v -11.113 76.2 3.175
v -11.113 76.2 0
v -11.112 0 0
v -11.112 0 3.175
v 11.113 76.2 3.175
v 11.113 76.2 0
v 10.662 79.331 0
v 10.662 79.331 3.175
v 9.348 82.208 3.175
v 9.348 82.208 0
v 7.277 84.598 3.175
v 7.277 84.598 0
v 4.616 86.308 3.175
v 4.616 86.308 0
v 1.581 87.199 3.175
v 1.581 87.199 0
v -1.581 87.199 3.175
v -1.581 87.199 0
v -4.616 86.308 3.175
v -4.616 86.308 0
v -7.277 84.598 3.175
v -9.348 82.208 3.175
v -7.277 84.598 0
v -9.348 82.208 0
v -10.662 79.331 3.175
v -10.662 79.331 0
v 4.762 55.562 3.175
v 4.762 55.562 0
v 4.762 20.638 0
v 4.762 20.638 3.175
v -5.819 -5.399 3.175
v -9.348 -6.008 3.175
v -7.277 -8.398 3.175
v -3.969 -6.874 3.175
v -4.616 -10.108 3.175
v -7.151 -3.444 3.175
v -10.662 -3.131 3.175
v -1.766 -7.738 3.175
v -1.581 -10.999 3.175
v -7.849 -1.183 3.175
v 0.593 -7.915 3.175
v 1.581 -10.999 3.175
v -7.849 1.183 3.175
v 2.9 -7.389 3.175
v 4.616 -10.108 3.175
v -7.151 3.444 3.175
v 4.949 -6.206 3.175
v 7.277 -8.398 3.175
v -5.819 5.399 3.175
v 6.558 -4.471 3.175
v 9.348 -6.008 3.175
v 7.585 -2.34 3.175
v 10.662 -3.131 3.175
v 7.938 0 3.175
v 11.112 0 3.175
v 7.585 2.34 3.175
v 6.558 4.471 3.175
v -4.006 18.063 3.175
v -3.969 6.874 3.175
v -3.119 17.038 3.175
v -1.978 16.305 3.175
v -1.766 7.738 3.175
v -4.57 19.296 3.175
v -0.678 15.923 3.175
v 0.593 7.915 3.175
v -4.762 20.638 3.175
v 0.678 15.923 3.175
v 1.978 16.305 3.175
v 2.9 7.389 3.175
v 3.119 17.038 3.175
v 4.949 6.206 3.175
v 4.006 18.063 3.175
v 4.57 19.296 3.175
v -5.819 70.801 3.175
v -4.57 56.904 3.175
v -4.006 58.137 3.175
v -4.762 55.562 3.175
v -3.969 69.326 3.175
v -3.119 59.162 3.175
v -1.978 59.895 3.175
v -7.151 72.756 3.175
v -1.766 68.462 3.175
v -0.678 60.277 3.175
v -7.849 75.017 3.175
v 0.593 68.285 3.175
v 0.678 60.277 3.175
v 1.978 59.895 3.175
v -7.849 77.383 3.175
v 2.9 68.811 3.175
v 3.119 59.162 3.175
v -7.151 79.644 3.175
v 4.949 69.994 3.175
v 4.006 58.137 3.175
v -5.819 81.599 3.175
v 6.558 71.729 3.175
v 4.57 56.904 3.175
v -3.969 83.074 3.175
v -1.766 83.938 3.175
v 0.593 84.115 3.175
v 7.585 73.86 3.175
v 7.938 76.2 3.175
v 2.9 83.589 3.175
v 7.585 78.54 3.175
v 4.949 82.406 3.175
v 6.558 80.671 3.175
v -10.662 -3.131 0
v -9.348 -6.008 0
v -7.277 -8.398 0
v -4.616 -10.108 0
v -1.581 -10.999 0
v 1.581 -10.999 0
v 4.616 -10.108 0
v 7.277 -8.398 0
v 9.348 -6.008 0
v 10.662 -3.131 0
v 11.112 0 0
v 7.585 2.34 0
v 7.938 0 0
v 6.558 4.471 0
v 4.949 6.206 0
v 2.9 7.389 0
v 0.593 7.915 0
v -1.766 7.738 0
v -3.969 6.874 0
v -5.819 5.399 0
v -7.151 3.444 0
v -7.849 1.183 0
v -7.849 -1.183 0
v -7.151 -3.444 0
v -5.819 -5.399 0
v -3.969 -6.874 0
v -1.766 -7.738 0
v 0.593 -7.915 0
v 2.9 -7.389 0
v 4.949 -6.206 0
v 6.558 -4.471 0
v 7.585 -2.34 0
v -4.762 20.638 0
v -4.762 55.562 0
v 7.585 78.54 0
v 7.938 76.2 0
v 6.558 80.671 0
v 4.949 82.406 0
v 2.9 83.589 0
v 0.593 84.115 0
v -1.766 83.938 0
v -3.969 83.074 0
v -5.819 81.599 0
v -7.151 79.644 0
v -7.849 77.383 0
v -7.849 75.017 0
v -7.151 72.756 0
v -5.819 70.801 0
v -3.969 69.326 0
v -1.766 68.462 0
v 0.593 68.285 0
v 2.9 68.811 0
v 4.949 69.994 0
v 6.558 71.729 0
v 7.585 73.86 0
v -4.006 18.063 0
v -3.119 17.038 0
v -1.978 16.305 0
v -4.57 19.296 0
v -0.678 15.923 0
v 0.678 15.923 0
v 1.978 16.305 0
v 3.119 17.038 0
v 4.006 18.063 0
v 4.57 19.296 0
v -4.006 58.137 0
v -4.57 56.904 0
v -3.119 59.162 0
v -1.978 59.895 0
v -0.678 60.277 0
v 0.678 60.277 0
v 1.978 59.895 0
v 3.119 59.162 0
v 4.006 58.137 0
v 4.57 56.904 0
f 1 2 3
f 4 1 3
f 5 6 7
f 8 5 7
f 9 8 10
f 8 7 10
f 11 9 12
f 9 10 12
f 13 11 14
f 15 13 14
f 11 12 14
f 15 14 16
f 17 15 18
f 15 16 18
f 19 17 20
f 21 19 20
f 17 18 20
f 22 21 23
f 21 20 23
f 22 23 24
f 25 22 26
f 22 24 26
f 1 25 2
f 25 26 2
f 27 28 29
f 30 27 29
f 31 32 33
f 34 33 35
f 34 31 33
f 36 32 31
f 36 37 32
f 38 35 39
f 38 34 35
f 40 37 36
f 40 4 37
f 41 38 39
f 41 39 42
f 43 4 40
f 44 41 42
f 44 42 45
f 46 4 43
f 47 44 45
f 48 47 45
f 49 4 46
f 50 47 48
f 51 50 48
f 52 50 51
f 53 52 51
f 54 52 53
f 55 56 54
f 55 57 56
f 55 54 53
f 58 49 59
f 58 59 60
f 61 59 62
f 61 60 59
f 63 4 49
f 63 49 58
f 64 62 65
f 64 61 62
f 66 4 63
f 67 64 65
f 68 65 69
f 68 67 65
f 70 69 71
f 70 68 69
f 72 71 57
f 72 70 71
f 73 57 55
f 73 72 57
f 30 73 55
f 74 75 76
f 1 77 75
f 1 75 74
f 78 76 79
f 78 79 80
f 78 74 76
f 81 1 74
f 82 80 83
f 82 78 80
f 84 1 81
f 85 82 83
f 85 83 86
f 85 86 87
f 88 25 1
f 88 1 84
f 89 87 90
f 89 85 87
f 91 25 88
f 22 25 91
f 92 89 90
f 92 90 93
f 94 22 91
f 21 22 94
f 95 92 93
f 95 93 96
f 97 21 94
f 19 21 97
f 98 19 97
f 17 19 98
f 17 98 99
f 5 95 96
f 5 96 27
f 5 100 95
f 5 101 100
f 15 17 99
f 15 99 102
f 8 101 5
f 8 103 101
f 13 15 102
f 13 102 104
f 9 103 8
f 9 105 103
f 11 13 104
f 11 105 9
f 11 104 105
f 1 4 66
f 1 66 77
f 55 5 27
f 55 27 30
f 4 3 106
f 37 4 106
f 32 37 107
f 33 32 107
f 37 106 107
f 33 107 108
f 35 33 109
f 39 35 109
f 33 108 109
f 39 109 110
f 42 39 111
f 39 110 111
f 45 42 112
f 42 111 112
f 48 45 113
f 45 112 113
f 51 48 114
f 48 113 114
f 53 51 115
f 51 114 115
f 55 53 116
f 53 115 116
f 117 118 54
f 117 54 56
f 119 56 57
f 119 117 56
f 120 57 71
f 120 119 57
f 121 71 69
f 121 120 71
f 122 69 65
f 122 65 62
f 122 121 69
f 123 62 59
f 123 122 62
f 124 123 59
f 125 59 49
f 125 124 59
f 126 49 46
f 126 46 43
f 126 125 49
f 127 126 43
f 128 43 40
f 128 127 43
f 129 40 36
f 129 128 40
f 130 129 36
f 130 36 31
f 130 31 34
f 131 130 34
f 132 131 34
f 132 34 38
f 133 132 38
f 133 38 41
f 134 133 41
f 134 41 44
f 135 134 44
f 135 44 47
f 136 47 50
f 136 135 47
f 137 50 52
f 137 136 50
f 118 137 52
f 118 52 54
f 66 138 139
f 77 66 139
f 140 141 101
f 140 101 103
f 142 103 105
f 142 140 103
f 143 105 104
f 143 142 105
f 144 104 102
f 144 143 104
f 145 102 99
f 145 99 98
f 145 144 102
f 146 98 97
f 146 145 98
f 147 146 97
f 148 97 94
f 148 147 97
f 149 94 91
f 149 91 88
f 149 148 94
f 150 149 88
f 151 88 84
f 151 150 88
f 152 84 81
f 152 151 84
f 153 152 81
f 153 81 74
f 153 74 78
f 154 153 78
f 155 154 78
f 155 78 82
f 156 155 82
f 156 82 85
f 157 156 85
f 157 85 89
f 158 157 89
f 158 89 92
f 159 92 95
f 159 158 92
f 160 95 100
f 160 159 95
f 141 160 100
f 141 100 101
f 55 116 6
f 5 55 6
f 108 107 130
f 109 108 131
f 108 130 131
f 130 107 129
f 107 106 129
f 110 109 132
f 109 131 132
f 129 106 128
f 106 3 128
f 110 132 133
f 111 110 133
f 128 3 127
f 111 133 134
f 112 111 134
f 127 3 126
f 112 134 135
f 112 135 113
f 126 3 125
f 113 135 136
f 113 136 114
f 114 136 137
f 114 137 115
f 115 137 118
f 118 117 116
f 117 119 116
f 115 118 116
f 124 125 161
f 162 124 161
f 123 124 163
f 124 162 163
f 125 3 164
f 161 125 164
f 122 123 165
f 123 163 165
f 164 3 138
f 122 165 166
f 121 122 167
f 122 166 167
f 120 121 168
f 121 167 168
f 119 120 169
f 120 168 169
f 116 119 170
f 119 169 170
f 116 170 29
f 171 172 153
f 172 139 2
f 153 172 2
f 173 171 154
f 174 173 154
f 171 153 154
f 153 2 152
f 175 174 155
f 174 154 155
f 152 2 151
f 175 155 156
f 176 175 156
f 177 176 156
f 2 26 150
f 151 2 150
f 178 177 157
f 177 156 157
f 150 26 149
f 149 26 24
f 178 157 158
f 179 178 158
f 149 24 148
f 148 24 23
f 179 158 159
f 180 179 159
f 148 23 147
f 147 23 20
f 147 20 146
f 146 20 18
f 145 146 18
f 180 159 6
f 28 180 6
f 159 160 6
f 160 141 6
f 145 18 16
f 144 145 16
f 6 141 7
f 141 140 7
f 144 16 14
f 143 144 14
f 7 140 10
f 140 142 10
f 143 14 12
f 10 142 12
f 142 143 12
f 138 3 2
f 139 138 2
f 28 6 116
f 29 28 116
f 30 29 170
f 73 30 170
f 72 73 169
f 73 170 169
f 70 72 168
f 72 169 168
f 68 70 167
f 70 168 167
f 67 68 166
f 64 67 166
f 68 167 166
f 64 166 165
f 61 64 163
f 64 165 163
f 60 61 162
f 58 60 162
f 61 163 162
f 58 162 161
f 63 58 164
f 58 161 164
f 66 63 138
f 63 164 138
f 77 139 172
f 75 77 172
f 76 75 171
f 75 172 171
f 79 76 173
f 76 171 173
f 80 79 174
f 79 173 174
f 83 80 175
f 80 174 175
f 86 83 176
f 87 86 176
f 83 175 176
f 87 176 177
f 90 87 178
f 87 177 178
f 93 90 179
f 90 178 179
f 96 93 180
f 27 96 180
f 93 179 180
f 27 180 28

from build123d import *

# Parameters (mm, degrees)
SKETCH1_R           = 7.9375
BOSS_EXTRUDE1_DEPTH = 3.175


with BuildPart() as part:
    # Sketch1 → Boss-Extrude1 (new body)
    with BuildSketch(Plane.XY):
        with BuildLine():
            ThreePointArc((11.1125, 76.2), (0, 87.3125), (-11.1125, 76.2))
            Line((-11.1125, 76.2), (-11.1125, 0))
            ThreePointArc((-11.1125, 0), (0, -11.1125), (11.1125, 0))
            Line((11.1125, 0), (11.1125, 76.2))
        make_face()
        with Locations((0, 76.2)):
            Circle(SKETCH1_R, mode=Mode.SUBTRACT)
        with BuildLine():
            Line((-4.7625, 20.6375), (-4.7625, 55.5625))
            ThreePointArc((-4.7625, 55.5625), (0, 60.325), (4.7625, 55.5625))
            Line((4.7625, 55.5625), (4.7625, 20.6375))
            ThreePointArc((4.7625, 20.6375), (0, 15.875), (-4.7625, 20.6375))
        make_face(mode=Mode.SUBTRACT)
        Circle(SKETCH1_R, mode=Mode.SUBTRACT)
    extrude(amount=BOSS_EXTRUDE1_DEPTH)


solid = part.part
